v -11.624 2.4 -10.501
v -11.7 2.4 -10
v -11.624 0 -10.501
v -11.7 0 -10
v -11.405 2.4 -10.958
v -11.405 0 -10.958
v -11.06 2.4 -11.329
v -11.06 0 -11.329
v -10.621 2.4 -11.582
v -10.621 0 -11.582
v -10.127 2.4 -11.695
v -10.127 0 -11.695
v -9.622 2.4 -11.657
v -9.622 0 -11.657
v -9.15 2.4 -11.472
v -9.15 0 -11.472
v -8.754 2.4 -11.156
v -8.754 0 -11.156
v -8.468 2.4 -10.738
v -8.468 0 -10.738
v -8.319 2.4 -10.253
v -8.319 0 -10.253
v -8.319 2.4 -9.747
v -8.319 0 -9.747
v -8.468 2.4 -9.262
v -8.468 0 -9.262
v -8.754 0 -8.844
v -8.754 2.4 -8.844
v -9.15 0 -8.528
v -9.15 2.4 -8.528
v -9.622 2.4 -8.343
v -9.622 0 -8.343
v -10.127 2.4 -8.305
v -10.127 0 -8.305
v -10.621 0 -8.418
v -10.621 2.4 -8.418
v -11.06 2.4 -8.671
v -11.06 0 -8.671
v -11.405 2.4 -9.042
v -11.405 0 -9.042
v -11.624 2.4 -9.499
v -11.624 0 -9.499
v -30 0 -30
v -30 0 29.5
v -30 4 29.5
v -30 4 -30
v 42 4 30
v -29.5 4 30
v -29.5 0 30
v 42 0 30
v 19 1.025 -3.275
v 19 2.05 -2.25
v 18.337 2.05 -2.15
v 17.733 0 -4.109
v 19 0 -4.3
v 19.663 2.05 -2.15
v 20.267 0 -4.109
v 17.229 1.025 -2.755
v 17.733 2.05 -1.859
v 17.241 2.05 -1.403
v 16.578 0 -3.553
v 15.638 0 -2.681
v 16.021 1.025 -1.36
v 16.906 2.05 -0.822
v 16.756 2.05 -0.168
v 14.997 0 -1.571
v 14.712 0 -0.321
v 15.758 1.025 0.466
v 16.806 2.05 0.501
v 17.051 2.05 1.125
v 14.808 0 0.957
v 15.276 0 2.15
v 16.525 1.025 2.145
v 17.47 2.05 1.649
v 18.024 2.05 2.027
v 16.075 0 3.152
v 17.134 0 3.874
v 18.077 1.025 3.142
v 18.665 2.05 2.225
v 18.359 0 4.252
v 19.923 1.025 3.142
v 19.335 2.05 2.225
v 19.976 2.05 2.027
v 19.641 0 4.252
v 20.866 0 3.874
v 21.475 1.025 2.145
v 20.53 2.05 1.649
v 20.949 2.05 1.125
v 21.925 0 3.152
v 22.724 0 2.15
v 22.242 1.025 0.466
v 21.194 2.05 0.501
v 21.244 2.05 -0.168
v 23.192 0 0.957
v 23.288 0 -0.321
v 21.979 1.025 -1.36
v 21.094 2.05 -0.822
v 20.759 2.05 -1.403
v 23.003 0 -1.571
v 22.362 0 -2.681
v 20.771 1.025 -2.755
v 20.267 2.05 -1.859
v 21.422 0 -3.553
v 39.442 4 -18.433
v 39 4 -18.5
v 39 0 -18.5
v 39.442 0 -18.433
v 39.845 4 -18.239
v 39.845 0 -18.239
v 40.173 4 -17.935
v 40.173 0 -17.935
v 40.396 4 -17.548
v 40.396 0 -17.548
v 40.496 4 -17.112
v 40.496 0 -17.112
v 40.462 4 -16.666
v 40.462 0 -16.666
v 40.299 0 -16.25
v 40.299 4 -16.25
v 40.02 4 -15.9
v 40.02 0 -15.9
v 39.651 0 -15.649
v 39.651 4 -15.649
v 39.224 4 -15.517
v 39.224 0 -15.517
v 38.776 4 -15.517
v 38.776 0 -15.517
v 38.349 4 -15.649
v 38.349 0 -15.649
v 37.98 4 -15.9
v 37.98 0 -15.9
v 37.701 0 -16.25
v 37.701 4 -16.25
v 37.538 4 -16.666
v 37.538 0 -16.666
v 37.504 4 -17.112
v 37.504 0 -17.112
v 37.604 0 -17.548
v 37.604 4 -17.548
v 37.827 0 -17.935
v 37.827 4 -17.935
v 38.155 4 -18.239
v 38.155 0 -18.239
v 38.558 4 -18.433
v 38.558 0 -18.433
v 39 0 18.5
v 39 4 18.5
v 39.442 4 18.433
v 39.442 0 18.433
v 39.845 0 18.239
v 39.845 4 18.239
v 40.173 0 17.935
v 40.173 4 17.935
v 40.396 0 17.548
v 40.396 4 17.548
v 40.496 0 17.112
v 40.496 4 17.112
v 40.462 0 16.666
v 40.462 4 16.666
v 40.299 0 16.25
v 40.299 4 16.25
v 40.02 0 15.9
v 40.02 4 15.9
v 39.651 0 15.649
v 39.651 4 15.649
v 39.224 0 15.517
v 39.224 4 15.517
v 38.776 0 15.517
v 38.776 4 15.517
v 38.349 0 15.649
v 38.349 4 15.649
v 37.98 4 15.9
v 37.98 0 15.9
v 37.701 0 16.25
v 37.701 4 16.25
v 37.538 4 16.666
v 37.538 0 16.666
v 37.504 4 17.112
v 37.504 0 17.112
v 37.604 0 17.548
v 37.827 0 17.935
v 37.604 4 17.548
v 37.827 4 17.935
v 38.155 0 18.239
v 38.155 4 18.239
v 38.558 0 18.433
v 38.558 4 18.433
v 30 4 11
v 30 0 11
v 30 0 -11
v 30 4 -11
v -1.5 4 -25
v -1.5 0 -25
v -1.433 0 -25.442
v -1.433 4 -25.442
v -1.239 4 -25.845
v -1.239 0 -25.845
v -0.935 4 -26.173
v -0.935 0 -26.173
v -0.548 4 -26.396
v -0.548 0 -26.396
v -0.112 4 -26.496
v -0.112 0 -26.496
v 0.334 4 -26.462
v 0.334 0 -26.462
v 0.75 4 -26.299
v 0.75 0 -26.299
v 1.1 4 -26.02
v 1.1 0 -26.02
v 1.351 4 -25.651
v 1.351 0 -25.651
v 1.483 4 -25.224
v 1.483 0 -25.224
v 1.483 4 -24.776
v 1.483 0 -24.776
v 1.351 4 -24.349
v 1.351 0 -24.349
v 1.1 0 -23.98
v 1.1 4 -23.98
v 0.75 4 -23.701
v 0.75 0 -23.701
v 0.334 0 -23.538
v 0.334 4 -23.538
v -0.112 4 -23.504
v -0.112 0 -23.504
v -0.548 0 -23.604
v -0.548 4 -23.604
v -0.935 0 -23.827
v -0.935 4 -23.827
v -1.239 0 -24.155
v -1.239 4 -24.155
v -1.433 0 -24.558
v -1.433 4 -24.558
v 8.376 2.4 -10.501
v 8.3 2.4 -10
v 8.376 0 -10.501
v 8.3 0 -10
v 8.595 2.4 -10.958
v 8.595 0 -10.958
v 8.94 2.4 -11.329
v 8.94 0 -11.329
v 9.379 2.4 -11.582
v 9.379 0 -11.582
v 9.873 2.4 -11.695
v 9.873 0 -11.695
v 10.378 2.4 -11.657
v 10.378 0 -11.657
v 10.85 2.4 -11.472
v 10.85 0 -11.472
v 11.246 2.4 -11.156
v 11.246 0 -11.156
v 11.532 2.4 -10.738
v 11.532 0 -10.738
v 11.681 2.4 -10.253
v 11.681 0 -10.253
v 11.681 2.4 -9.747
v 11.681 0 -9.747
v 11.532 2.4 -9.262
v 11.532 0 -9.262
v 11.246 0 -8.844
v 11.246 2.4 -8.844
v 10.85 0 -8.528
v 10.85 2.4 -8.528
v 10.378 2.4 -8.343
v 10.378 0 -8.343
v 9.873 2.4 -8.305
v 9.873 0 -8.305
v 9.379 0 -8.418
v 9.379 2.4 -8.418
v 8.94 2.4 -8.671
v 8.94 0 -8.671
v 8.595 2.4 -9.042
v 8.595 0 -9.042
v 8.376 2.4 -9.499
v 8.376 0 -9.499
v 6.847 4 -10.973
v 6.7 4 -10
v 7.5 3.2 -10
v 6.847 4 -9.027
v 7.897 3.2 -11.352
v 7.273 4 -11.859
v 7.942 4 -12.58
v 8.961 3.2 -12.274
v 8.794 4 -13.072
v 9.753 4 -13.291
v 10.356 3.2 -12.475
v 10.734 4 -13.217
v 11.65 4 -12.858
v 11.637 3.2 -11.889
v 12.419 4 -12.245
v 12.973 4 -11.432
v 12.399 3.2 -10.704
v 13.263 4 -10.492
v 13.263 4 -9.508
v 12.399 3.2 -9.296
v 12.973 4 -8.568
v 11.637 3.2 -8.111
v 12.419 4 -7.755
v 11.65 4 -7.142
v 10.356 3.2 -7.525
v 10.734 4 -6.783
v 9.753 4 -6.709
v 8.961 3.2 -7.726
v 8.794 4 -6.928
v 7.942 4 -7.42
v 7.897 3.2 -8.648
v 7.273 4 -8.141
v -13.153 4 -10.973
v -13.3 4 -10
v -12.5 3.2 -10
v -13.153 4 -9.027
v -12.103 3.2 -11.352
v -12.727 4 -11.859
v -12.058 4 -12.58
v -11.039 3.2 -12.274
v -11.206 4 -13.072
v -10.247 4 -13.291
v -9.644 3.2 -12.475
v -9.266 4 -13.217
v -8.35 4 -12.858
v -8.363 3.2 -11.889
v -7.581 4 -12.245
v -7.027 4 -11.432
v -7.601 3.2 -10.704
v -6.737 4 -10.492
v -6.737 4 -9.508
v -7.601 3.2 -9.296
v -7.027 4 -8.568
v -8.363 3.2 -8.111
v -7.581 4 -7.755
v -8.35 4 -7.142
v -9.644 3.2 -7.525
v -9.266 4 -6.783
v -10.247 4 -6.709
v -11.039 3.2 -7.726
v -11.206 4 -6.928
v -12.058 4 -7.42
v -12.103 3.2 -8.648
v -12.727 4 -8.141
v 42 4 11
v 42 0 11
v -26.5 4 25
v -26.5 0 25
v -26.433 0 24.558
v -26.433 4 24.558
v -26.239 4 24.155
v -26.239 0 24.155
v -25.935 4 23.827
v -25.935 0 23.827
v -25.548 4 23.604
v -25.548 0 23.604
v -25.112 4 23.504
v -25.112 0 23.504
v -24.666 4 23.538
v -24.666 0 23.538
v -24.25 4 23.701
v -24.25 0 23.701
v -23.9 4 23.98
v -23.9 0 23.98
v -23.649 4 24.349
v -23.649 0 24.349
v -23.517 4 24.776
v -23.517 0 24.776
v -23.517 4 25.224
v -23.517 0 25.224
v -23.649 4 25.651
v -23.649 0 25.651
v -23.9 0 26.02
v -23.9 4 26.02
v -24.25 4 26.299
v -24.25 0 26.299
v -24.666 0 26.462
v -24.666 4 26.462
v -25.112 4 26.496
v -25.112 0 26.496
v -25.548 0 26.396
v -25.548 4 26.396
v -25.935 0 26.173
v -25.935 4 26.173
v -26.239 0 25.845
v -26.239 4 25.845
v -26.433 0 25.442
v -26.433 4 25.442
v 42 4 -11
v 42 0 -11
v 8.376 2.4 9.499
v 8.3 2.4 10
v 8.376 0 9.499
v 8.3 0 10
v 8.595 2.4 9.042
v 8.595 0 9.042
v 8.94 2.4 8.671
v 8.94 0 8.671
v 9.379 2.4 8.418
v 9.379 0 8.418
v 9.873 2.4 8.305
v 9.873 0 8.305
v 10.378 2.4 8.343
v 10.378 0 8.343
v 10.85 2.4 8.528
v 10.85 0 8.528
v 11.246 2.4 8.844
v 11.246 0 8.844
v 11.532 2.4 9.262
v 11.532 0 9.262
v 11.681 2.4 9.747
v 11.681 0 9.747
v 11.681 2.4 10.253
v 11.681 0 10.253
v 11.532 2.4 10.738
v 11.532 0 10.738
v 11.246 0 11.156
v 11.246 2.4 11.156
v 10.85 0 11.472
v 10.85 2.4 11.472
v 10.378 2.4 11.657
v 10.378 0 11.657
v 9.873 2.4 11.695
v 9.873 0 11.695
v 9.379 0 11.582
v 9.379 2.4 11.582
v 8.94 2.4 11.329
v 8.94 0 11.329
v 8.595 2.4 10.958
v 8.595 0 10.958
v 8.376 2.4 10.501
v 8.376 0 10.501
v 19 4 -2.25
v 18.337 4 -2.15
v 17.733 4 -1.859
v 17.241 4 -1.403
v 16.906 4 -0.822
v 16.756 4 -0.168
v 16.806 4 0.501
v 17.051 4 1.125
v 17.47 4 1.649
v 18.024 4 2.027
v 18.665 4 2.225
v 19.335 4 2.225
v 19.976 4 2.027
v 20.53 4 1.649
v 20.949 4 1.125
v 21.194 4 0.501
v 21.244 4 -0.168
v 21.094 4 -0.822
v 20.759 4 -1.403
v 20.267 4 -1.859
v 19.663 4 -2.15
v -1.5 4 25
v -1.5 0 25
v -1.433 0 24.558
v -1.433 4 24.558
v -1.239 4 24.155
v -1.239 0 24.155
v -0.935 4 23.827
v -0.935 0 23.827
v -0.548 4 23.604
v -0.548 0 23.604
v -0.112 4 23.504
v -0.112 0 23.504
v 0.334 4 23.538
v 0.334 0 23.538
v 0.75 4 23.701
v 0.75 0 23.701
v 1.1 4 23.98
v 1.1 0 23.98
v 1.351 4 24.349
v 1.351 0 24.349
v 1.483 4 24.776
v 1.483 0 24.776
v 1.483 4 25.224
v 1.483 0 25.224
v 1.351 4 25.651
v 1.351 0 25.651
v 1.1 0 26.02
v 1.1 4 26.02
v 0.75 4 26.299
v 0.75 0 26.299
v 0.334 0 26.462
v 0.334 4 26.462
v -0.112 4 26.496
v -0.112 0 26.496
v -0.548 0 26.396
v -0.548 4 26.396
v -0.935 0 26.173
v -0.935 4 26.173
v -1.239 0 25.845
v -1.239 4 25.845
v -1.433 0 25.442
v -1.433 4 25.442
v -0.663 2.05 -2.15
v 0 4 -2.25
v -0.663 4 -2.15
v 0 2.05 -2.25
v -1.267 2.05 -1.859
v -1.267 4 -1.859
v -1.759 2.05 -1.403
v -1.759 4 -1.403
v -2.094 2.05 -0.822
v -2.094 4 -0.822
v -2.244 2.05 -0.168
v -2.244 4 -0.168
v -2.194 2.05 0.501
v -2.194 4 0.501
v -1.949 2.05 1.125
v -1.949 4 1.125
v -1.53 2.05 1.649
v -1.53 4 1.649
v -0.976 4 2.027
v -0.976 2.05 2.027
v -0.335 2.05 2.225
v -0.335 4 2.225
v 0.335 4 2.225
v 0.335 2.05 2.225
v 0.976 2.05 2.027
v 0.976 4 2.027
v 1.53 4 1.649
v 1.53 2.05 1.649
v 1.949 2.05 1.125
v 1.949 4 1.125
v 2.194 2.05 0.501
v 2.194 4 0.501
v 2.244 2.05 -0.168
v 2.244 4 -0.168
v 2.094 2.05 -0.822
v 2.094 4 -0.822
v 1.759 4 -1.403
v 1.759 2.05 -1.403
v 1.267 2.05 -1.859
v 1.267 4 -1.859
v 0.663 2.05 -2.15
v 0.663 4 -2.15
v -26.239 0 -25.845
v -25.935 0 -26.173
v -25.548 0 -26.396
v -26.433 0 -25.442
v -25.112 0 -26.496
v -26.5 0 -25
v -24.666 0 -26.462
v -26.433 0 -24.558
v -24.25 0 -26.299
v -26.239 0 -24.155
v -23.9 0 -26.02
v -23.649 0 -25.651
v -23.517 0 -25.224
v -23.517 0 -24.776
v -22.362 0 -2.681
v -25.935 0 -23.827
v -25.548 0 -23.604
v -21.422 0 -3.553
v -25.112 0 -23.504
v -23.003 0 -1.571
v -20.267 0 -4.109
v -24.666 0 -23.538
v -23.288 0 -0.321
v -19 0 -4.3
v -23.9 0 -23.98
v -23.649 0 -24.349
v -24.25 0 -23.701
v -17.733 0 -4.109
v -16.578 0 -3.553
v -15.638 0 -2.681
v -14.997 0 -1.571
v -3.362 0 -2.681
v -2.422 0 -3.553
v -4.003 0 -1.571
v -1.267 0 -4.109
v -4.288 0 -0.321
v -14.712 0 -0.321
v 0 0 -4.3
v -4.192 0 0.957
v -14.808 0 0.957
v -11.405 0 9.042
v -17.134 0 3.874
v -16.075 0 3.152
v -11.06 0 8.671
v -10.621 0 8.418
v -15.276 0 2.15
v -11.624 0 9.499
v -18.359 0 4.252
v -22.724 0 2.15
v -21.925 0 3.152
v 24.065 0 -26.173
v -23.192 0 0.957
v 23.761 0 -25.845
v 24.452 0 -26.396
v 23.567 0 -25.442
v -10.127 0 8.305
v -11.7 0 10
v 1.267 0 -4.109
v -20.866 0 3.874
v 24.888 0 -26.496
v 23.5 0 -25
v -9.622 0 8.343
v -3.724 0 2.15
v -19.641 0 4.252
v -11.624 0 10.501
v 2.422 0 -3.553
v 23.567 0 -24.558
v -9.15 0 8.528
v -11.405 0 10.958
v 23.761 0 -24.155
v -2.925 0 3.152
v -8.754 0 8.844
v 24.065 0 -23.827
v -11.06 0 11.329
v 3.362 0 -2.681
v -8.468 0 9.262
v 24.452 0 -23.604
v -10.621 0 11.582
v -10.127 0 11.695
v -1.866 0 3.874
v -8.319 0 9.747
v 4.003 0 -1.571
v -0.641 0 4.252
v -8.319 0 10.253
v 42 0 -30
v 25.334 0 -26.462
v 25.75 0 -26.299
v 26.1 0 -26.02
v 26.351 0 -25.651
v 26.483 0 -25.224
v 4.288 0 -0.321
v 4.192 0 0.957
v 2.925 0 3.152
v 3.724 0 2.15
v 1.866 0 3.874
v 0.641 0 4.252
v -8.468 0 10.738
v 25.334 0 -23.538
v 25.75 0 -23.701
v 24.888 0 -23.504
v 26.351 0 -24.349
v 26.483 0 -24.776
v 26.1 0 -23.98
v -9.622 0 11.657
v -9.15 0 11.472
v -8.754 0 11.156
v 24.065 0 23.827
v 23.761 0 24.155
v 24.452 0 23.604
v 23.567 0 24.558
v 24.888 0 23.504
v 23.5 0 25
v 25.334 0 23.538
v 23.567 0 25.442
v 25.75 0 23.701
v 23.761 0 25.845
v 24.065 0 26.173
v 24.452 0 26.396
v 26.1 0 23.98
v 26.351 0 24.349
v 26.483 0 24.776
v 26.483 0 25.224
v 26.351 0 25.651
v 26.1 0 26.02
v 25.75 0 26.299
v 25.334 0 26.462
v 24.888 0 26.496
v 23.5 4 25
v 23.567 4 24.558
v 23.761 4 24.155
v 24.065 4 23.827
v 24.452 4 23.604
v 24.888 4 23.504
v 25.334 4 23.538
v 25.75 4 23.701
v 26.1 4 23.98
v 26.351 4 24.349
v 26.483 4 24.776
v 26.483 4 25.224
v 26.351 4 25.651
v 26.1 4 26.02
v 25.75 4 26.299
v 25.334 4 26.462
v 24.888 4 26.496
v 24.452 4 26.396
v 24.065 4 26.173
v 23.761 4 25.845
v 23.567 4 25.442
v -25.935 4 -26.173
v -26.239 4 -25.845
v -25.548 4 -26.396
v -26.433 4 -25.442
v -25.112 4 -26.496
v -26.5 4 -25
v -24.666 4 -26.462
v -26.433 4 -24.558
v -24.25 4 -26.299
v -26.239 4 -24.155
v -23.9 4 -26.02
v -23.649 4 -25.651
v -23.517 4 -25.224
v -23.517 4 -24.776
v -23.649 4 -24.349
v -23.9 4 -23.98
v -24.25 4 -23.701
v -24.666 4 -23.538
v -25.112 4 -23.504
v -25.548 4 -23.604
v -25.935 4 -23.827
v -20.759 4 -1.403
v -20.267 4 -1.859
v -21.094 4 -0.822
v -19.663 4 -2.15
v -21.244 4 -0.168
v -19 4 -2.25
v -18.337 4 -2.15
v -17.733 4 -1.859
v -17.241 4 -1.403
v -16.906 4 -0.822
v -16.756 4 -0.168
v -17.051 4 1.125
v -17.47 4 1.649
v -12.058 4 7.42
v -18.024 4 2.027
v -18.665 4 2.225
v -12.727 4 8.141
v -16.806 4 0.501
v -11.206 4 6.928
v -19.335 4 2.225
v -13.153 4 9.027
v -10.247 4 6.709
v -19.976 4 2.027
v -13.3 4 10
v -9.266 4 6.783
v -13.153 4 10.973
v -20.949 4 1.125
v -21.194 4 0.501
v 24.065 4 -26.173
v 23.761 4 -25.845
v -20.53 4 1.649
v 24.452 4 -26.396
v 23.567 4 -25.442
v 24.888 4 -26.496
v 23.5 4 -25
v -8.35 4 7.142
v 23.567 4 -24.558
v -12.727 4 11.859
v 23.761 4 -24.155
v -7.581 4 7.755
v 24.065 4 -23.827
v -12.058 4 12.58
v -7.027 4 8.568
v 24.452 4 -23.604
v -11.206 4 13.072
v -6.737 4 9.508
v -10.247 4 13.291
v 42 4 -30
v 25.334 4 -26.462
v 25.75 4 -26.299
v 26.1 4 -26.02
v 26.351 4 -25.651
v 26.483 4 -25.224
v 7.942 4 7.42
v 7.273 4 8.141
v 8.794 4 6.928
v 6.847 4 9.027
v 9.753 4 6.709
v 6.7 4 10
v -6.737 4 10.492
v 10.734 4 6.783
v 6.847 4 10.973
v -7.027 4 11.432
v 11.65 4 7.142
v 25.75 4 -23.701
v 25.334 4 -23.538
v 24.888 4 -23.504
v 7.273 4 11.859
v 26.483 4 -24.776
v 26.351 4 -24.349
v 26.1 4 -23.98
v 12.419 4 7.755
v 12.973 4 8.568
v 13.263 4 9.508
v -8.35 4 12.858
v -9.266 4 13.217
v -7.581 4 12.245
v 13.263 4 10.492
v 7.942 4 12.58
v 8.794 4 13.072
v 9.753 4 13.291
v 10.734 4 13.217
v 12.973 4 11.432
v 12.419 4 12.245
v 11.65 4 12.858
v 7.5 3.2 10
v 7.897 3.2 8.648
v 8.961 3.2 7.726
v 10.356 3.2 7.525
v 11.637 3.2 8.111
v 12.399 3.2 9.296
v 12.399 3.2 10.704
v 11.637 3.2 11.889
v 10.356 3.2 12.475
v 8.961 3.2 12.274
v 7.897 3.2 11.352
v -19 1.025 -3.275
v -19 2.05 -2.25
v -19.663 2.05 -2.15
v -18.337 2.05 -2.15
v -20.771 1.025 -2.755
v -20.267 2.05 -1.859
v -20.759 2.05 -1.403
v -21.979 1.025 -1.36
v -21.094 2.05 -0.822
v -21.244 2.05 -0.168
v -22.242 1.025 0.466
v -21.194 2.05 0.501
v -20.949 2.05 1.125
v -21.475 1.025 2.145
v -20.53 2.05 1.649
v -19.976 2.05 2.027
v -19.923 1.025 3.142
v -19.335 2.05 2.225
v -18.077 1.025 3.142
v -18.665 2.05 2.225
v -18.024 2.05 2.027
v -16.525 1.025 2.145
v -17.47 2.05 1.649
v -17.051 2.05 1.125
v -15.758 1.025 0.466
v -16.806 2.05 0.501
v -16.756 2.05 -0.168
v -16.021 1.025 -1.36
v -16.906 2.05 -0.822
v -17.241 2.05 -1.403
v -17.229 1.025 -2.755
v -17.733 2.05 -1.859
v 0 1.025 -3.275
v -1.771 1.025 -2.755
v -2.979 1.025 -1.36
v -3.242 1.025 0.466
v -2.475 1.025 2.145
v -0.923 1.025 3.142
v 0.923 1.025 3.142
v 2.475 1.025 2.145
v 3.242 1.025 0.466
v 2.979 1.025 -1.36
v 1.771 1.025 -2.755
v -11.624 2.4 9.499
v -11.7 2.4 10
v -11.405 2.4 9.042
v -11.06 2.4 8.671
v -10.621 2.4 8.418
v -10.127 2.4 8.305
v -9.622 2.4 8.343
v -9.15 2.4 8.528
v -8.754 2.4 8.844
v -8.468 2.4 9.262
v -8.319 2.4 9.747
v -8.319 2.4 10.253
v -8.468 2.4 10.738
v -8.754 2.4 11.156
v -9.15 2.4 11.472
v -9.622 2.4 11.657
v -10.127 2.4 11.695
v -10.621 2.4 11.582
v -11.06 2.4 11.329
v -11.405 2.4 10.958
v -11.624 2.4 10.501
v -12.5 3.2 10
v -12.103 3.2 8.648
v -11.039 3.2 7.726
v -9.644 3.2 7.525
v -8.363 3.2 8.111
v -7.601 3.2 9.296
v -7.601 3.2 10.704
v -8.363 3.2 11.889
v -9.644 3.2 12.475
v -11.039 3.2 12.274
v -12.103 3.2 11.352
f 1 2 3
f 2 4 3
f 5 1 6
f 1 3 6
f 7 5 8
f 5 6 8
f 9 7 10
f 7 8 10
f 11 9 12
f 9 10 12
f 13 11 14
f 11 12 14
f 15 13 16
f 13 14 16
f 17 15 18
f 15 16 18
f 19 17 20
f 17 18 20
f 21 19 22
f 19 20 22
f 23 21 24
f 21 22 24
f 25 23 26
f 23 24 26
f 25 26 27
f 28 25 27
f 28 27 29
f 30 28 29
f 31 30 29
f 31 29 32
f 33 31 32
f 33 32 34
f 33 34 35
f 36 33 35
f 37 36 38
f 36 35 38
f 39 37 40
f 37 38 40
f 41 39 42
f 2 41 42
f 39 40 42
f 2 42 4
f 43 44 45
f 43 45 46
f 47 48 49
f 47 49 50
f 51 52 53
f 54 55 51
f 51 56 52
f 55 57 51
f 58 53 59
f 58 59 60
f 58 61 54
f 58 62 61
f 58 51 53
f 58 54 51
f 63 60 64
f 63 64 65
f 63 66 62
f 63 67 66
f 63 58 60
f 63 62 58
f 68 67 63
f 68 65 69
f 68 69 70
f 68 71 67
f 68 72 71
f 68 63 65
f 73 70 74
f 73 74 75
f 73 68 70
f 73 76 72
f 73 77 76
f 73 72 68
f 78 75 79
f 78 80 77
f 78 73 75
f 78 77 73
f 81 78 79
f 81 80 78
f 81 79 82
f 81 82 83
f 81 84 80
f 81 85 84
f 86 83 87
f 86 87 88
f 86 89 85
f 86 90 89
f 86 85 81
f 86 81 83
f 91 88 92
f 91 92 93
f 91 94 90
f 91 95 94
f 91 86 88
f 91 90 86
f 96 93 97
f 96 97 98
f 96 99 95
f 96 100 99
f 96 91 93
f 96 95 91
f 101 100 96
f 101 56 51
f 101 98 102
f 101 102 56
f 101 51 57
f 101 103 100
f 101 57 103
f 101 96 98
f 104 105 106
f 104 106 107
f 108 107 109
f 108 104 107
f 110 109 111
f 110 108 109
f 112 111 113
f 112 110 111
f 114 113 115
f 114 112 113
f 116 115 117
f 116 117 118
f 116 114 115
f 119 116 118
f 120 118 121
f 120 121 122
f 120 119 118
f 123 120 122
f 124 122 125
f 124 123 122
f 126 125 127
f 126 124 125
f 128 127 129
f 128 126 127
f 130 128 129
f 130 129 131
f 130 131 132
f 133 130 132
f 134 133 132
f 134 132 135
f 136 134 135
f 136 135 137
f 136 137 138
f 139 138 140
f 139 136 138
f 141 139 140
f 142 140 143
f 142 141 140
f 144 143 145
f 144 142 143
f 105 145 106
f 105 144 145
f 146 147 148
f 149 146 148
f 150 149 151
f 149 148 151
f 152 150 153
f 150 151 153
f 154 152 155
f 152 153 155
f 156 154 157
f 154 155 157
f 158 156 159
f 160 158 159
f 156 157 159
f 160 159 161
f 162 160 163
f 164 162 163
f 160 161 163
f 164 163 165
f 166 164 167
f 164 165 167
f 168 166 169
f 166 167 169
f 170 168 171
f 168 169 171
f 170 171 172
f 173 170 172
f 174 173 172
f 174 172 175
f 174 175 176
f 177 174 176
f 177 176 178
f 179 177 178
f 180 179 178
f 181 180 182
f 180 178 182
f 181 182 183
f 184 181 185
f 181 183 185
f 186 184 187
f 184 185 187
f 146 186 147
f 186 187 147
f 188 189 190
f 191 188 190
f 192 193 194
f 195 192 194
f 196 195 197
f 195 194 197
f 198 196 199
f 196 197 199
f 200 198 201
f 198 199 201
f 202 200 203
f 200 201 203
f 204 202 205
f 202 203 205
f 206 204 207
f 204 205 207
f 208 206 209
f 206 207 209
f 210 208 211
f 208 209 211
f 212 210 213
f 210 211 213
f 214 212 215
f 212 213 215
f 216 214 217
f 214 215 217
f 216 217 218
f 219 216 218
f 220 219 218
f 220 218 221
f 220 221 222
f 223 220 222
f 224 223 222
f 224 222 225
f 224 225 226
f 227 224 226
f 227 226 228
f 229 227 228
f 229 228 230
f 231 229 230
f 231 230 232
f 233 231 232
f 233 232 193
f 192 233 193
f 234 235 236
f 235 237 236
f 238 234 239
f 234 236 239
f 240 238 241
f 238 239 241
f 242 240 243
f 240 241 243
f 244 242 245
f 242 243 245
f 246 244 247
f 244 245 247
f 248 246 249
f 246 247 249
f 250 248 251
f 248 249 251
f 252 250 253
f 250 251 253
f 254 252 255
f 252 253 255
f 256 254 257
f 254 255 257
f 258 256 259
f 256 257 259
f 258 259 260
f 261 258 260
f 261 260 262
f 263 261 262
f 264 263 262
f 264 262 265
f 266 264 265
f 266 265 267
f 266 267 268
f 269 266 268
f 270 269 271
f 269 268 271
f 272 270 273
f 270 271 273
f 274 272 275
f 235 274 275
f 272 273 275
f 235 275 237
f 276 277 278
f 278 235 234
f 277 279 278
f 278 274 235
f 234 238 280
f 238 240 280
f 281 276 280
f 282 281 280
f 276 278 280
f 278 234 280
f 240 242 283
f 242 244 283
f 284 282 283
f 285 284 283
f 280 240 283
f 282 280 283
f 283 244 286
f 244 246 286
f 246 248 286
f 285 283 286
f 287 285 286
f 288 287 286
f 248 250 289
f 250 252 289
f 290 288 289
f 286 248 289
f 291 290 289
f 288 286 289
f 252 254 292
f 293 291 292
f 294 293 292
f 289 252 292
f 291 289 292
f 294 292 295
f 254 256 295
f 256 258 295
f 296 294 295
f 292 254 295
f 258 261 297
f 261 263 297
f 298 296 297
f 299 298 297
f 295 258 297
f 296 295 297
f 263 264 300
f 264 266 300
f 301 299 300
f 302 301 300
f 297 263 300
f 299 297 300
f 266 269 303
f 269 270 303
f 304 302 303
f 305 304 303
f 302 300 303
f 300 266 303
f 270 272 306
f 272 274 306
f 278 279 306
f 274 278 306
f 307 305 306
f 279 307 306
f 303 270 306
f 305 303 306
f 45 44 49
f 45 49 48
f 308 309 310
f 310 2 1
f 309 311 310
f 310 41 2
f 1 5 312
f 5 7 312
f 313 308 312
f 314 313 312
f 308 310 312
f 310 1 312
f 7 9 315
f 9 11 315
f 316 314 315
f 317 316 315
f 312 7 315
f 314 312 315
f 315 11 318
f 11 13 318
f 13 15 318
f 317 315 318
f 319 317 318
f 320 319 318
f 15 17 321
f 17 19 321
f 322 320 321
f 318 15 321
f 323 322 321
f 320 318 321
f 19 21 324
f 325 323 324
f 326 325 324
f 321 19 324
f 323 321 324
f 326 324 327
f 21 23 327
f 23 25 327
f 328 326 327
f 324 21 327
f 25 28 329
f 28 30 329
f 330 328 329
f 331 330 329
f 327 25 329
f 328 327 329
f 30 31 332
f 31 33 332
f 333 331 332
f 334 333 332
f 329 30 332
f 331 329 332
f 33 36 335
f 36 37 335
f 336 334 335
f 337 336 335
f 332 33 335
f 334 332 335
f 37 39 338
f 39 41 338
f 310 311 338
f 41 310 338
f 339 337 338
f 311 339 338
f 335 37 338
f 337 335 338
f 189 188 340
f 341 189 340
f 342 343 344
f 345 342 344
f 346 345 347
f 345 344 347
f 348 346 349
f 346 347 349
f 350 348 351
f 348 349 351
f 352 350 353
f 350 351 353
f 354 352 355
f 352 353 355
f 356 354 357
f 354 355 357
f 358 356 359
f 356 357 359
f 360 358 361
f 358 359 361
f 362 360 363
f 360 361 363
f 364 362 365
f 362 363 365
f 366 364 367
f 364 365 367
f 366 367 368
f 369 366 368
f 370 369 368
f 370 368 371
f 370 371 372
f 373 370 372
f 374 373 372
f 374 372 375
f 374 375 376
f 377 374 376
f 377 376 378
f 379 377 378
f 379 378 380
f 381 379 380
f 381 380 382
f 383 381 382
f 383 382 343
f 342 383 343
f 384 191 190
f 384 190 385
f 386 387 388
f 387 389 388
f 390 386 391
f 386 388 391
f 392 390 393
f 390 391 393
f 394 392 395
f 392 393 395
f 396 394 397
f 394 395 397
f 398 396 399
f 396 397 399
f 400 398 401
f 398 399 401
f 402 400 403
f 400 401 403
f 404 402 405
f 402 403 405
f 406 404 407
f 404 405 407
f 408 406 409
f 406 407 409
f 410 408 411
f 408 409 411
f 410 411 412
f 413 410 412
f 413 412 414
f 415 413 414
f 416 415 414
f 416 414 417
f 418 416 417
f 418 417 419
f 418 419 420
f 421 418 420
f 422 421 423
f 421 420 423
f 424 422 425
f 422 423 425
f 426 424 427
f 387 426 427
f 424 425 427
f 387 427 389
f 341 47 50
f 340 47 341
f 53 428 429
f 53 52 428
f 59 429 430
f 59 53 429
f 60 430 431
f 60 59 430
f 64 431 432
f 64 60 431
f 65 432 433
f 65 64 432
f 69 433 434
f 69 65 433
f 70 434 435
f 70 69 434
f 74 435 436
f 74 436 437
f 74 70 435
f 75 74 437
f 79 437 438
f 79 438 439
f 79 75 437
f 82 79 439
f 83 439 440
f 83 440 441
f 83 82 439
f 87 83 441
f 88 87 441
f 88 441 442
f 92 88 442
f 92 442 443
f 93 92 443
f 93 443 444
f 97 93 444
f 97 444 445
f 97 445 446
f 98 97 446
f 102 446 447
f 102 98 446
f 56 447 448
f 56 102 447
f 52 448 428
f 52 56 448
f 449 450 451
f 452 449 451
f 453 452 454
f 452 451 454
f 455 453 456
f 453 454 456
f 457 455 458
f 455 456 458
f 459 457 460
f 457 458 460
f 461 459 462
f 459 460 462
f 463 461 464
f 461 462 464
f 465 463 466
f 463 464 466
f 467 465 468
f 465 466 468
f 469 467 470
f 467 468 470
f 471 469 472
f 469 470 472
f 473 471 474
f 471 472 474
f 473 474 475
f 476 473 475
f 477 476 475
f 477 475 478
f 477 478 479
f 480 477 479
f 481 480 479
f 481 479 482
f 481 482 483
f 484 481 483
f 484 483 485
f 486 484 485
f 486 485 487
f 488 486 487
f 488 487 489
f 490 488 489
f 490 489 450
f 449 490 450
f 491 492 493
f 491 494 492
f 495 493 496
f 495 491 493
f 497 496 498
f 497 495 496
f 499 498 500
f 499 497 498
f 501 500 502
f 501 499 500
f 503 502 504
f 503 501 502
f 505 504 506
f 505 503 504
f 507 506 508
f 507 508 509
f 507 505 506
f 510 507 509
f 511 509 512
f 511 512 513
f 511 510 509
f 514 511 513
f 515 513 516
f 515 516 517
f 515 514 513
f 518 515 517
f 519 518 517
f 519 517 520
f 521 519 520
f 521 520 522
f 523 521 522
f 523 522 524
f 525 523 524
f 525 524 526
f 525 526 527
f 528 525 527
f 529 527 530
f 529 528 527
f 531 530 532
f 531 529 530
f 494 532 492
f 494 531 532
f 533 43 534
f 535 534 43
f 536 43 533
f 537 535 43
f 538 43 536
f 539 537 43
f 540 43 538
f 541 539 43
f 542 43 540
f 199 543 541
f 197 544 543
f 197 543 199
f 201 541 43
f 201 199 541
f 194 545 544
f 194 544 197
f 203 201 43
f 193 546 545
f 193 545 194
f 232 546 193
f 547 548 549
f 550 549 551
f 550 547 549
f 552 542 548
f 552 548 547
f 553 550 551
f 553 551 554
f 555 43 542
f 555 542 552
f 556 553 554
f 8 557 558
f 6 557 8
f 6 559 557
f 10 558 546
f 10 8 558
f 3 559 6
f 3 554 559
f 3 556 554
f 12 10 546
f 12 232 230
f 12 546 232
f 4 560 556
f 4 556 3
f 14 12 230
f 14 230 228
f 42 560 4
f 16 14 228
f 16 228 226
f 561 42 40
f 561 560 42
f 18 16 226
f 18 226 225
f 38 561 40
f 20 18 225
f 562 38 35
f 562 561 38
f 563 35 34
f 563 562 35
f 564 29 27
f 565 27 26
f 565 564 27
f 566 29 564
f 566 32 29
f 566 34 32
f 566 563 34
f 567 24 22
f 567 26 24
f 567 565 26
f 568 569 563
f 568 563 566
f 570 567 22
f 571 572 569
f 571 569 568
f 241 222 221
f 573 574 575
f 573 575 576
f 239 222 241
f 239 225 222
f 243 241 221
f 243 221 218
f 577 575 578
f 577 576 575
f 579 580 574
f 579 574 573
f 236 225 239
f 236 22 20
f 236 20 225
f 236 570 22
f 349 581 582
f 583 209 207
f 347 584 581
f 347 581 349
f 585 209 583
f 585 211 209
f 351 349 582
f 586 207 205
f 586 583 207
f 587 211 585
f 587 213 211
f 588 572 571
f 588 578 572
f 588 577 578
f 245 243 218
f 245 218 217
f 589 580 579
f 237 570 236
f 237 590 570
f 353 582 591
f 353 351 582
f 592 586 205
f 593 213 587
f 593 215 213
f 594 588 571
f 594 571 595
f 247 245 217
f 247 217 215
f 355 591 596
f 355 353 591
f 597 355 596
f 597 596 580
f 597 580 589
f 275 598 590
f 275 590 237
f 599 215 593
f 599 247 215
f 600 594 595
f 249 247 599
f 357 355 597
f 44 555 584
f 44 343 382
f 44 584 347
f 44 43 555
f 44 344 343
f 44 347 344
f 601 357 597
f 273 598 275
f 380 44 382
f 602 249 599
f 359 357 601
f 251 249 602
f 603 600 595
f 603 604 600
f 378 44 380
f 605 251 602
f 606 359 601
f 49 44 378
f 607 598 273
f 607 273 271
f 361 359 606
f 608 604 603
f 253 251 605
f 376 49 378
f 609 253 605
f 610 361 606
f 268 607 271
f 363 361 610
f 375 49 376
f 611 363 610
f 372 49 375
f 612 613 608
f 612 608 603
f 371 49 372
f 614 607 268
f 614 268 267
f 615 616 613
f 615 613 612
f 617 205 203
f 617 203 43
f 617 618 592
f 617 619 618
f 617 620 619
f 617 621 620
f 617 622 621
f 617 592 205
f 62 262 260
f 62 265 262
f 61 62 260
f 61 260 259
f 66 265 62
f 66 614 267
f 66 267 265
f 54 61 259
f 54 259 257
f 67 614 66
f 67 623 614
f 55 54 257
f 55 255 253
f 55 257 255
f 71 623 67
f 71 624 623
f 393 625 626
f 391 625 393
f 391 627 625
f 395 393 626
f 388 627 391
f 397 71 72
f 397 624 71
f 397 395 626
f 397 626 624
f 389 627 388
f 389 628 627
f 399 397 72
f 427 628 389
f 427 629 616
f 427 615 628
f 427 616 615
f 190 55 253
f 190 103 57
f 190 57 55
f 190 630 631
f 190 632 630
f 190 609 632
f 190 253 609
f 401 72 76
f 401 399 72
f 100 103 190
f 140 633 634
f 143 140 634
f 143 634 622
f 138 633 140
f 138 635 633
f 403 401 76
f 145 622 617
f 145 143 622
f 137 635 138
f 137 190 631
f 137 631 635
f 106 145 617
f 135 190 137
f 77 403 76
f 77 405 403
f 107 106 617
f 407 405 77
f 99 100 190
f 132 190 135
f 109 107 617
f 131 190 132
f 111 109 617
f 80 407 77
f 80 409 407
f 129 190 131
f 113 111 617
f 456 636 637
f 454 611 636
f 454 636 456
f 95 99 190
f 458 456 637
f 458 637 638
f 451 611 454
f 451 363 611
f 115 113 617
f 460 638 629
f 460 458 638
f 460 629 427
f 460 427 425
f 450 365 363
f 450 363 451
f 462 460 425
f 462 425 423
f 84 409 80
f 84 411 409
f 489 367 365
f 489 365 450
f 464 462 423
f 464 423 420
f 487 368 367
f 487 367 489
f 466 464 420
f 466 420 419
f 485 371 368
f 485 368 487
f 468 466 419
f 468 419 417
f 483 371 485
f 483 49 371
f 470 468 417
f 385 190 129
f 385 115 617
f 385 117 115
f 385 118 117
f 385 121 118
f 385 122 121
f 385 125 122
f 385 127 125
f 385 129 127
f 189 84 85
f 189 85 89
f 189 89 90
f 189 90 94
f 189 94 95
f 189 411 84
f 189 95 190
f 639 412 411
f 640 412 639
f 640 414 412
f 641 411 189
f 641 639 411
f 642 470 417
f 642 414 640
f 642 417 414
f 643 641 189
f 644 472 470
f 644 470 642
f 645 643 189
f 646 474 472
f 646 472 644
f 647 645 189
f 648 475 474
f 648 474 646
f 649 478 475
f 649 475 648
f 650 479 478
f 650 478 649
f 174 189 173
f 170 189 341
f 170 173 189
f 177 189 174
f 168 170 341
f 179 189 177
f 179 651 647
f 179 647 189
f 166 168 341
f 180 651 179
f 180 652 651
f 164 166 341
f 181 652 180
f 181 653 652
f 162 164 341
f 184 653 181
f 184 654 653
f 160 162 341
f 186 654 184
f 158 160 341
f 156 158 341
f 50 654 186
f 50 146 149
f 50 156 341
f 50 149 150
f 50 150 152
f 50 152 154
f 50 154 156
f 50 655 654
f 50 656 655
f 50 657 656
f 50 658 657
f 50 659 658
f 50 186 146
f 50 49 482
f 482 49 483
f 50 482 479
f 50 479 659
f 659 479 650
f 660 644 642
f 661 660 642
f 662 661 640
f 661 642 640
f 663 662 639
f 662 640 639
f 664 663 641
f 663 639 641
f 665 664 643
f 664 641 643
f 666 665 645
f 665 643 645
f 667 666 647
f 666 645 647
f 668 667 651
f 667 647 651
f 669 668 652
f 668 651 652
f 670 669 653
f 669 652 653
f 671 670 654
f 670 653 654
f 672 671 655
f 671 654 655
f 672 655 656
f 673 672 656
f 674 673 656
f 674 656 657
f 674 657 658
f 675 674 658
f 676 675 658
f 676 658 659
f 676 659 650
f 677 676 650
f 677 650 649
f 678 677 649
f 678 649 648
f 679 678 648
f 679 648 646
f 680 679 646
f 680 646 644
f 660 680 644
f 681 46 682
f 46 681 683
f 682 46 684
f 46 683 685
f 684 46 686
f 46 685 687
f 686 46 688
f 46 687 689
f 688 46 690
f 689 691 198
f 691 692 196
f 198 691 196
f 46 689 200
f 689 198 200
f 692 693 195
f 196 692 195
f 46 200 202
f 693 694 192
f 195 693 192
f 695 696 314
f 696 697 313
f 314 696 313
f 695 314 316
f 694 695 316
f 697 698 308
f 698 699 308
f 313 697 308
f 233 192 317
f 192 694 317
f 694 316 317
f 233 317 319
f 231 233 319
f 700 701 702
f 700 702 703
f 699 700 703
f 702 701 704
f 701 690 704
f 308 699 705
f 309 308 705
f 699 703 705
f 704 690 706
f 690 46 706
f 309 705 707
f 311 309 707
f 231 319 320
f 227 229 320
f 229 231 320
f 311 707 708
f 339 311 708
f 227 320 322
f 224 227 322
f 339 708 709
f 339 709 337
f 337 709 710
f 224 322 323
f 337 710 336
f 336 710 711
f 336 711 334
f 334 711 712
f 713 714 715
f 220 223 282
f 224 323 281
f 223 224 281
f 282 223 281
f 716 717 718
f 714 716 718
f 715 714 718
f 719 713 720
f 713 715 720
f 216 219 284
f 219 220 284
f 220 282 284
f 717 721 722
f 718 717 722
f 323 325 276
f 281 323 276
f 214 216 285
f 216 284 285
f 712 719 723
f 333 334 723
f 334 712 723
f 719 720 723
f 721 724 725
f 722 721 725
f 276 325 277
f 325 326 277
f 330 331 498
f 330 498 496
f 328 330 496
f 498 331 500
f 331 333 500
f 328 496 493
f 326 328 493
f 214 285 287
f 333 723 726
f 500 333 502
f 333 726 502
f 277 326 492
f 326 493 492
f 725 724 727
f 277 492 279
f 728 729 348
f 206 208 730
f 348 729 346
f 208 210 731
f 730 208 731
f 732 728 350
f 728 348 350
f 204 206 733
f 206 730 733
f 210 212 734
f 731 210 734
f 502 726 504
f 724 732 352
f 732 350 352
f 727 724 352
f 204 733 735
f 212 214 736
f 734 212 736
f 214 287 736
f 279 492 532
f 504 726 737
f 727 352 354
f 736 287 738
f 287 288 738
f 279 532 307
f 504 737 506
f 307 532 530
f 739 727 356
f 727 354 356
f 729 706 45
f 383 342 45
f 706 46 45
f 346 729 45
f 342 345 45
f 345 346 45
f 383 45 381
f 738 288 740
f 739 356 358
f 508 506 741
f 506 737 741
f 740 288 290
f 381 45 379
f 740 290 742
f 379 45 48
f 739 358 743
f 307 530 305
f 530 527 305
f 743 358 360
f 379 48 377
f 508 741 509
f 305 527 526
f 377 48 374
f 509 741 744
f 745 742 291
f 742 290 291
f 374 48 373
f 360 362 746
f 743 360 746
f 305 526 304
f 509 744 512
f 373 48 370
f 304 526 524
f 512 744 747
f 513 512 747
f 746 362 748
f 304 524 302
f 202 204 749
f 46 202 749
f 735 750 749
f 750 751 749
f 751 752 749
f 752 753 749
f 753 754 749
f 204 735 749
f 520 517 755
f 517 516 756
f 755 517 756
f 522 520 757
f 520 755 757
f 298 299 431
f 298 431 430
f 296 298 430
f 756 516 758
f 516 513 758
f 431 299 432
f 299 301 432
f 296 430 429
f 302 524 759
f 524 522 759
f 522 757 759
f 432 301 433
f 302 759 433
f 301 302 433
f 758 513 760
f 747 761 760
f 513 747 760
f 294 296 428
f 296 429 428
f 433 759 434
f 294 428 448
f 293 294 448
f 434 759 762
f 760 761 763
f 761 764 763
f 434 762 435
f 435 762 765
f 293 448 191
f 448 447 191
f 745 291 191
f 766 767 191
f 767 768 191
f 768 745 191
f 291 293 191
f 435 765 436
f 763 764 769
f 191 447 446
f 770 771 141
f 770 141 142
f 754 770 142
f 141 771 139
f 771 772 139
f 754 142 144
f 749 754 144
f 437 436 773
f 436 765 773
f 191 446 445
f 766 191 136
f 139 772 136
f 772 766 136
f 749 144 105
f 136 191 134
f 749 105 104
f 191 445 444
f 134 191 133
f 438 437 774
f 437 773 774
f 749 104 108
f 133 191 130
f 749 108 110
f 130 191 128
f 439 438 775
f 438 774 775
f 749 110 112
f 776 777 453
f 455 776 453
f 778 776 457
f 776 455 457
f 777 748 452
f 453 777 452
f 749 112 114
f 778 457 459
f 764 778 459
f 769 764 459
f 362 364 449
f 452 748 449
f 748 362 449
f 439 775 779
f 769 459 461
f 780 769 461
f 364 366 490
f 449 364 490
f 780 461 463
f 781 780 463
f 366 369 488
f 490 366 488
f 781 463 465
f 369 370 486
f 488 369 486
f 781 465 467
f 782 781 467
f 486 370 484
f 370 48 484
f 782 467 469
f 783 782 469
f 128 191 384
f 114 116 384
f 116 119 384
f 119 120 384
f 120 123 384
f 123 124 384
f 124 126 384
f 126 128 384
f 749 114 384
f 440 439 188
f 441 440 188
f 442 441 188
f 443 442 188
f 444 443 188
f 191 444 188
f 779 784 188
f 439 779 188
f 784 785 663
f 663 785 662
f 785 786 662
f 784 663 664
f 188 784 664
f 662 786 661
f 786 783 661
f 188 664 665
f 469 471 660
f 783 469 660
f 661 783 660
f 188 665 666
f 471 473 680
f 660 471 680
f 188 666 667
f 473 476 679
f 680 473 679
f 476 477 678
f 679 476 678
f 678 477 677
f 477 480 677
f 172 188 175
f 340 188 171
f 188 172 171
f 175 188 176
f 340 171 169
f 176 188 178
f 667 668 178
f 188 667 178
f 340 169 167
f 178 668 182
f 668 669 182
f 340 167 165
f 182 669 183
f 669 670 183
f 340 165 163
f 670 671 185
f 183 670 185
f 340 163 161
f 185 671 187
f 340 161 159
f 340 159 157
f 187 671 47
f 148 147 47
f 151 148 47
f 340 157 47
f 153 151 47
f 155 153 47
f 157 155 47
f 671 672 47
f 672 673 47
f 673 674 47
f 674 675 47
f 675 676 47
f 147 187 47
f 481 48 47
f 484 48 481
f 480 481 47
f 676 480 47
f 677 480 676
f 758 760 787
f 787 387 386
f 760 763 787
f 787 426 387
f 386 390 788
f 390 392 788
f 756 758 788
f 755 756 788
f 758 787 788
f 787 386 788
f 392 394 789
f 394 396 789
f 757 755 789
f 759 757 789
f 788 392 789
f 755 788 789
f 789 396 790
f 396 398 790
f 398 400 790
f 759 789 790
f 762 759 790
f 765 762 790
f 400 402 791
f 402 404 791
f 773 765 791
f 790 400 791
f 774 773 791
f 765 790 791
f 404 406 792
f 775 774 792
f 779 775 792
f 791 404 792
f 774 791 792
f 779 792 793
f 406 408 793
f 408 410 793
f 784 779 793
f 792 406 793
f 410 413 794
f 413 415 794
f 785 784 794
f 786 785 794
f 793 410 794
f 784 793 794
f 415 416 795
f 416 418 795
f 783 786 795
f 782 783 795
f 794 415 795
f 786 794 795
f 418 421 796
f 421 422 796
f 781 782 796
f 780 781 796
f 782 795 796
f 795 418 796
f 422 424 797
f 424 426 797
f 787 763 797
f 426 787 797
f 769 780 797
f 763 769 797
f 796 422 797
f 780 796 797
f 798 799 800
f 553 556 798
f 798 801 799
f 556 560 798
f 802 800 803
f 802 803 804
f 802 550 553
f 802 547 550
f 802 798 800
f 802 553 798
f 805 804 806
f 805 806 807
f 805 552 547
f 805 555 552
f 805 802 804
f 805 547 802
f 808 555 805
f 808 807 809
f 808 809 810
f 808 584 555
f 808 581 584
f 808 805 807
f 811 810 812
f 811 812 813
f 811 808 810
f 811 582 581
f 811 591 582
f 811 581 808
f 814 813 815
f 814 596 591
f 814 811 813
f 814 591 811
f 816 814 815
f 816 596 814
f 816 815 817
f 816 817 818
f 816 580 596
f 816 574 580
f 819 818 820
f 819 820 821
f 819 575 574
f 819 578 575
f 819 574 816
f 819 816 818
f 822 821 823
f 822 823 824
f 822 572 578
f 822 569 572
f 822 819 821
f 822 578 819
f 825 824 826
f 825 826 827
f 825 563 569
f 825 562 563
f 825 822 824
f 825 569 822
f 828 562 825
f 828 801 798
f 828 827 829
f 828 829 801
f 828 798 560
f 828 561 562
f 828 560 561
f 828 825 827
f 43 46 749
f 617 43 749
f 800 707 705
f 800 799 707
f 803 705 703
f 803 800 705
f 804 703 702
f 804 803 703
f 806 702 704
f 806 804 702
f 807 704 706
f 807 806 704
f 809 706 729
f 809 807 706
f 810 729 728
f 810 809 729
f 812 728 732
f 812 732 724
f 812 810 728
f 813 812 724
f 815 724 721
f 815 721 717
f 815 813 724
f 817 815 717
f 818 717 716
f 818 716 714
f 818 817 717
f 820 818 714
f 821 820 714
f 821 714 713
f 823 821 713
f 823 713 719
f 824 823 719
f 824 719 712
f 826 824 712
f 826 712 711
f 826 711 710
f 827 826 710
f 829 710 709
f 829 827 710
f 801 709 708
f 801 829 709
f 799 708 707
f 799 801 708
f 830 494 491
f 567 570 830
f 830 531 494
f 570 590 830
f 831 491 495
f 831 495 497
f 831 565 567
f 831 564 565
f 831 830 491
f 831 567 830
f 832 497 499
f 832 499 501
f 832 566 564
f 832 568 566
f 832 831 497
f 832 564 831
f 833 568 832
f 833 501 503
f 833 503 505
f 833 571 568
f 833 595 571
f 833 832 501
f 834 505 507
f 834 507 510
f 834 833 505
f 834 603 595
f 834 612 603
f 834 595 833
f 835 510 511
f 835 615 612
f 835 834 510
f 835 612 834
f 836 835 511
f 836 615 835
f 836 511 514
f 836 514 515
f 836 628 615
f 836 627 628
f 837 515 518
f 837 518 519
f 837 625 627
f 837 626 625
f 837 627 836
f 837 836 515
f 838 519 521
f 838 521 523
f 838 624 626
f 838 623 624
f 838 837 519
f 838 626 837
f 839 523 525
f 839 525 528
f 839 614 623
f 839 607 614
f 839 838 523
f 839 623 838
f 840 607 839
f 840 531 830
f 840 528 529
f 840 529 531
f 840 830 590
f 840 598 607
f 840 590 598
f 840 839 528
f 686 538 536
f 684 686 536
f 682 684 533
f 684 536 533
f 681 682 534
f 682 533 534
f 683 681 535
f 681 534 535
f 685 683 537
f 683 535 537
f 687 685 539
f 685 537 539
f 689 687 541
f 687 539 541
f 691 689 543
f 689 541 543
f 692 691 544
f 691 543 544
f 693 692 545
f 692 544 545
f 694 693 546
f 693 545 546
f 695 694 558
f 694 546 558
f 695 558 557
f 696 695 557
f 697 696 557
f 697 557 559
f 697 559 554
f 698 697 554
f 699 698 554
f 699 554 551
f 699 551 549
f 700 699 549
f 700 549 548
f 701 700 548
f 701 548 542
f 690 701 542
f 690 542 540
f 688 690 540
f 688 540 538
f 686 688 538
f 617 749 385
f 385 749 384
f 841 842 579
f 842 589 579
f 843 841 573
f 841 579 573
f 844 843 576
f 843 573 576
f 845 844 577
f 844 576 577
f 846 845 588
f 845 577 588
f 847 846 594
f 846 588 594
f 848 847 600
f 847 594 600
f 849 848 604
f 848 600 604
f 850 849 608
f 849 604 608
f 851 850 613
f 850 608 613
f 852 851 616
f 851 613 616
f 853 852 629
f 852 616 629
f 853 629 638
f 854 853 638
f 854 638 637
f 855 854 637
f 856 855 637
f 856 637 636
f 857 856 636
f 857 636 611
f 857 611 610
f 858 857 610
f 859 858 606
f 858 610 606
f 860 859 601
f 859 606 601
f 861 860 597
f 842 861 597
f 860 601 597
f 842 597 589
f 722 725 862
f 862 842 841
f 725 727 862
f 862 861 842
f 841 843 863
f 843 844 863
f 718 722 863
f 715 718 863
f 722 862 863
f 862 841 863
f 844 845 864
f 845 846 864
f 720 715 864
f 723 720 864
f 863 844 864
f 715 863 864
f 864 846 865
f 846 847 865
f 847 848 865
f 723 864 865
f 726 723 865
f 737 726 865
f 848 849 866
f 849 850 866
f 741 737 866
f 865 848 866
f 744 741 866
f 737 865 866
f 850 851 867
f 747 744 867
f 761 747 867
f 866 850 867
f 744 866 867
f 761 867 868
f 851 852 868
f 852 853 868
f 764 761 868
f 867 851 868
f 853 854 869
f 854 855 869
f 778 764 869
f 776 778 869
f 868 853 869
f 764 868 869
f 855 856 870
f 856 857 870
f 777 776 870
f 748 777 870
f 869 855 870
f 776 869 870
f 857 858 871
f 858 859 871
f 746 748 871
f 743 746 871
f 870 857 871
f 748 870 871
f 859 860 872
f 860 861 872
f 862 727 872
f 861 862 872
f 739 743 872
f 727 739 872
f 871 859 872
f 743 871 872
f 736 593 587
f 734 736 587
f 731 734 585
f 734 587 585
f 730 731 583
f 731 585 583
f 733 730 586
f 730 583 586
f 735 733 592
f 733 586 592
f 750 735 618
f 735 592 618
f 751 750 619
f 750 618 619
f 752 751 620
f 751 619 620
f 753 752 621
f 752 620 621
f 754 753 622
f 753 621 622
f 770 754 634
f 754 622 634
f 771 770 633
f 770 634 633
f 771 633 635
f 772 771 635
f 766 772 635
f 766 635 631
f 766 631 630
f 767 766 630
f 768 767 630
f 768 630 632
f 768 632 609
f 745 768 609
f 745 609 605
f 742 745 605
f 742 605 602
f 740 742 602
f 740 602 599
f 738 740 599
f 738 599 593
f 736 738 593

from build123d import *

# Parameters (mm, degrees)
SKETCH_1_W                   = 60
SKETCH_1_H                   = 60
EXTRUDE_1_DEPTH              = 4
HOLE_WIZARD_M3_1_D           = 3.4
HOLE_WIZARD_M3_1_CSINK_D     = 6.6
HOLE_WIZARD_M3_1_CSINK_ANGLE = 90
HOLE_WIZARD_M4_1_AT_2_COUNT  = 2
HOLE_WIZARD_M4_1_AT_2_PITCH  = 19
HOLE_WIZARD_M4_1_AT_3_COUNT  = 2
HOLE_WIZARD_M4_1_AT_3_PITCH  = 38
HOLE_WIZARD_1_D              = 3
SKETCH_9_W                   = 12
SKETCH_9_H                   = 19
SKETCH_9_R                   = 1.5
EXTRUDE_3_DEPTH              = 4
CHAMFER_1_SIZE               = 0.5


with BuildPart() as part:
    # 草图1 → 凸台-拉伸1 (new body)
    with BuildSketch(Plane(origin=(0, 0, 0), x_dir=(1, 0, 0), z_dir=(0, 1, 0))):
        Rectangle(SKETCH_1_W, SKETCH_1_H)
    extrude(amount=EXTRUDE_1_DEPTH)

    # M3 十字槽沉头木螺钉的锥形沉头孔1 (through all)
    with Locations(Plane(origin=(0, 4, 0), x_dir=(1, 0, 0), z_dir=(0, 1, 0))):
        with Locations((-10, 10), (10, 10), (10, -10), (-10, -10)):
            CounterSinkHole(HOLE_WIZARD_M3_1_D / 2, HOLE_WIZARD_M3_1_CSINK_D / 2, counter_sink_angle=HOLE_WIZARD_M3_1_CSINK_ANGLE)

    # 草图5 → M4 十字槽沉头木螺钉的锥形沉头孔1 (revolve, cut)
    with BuildSketch(Plane(origin=(-19, 0, 0), x_dir=(0, 0, -1), z_dir=(1, 0, 0))):
        Polygon((0, 0), (0, 4), (2.25, 4), (2.25, 2.05), (4.3, 0), align=None)
    hole_wizard_m4_1 = revolve(axis=Axis((-19, -6.35, 0), (0, 1, 0)), mode=Mode.SUBTRACT)

    # M4 十字槽沉头木螺钉的锥形沉头孔1 at 2: M4 十字槽沉头木螺钉的锥形沉头孔1 ×2
    with Locations(*[(i * HOLE_WIZARD_M4_1_AT_2_PITCH, 0, 0) for i in range(1, HOLE_WIZARD_M4_1_AT_2_COUNT)]):
        add(hole_wizard_m4_1, mode=Mode.SUBTRACT)

    # M4 十字槽沉头木螺钉的锥形沉头孔1 at 3: M4 十字槽沉头木螺钉的锥形沉头孔1 ×2
    with Locations(*[(i * HOLE_WIZARD_M4_1_AT_3_PITCH, 0, 0) for i in range(1, HOLE_WIZARD_M4_1_AT_3_COUNT)]):
        add(hole_wizard_m4_1, mode=Mode.SUBTRACT)

    # 孔1 (through all)
    with Locations(Plane(origin=(0, 4, 0), x_dir=(1, 0, 0), z_dir=(0, 1, 0))):
        with Locations((25, 25), (25, -25), (0, -25), (-25, -25), (-25, 25), (0, 25)):
            Hole(HOLE_WIZARD_1_D / 2)

    # 草图9 → 凸台-拉伸3 (add)
    with BuildSketch(Plane(origin=(0, 4, 0), x_dir=(1, 0, 0), z_dir=(0, 1, 0))):
        with Locations((36, -20.5)):
            Rectangle(SKETCH_9_W, SKETCH_9_H)
        with Locations(Location((39, -17, 0), (0, 0, 270))):
            Circle(SKETCH_9_R, mode=Mode.SUBTRACT)
    extrude_3 = extrude(amount=-EXTRUDE_3_DEPTH)

    # 倒角1
    chamfer_1_edges = [part.edges().sort_by_distance(p)[0] for p in [
        (-30, 2, 30),
    ]]
    chamfer(chamfer_1_edges, length=CHAMFER_1_SIZE)

    # 镜向1: 凸台-拉伸3 across plane
    add(extrude_3.mirror(Plane.XY))


solid = part.part
